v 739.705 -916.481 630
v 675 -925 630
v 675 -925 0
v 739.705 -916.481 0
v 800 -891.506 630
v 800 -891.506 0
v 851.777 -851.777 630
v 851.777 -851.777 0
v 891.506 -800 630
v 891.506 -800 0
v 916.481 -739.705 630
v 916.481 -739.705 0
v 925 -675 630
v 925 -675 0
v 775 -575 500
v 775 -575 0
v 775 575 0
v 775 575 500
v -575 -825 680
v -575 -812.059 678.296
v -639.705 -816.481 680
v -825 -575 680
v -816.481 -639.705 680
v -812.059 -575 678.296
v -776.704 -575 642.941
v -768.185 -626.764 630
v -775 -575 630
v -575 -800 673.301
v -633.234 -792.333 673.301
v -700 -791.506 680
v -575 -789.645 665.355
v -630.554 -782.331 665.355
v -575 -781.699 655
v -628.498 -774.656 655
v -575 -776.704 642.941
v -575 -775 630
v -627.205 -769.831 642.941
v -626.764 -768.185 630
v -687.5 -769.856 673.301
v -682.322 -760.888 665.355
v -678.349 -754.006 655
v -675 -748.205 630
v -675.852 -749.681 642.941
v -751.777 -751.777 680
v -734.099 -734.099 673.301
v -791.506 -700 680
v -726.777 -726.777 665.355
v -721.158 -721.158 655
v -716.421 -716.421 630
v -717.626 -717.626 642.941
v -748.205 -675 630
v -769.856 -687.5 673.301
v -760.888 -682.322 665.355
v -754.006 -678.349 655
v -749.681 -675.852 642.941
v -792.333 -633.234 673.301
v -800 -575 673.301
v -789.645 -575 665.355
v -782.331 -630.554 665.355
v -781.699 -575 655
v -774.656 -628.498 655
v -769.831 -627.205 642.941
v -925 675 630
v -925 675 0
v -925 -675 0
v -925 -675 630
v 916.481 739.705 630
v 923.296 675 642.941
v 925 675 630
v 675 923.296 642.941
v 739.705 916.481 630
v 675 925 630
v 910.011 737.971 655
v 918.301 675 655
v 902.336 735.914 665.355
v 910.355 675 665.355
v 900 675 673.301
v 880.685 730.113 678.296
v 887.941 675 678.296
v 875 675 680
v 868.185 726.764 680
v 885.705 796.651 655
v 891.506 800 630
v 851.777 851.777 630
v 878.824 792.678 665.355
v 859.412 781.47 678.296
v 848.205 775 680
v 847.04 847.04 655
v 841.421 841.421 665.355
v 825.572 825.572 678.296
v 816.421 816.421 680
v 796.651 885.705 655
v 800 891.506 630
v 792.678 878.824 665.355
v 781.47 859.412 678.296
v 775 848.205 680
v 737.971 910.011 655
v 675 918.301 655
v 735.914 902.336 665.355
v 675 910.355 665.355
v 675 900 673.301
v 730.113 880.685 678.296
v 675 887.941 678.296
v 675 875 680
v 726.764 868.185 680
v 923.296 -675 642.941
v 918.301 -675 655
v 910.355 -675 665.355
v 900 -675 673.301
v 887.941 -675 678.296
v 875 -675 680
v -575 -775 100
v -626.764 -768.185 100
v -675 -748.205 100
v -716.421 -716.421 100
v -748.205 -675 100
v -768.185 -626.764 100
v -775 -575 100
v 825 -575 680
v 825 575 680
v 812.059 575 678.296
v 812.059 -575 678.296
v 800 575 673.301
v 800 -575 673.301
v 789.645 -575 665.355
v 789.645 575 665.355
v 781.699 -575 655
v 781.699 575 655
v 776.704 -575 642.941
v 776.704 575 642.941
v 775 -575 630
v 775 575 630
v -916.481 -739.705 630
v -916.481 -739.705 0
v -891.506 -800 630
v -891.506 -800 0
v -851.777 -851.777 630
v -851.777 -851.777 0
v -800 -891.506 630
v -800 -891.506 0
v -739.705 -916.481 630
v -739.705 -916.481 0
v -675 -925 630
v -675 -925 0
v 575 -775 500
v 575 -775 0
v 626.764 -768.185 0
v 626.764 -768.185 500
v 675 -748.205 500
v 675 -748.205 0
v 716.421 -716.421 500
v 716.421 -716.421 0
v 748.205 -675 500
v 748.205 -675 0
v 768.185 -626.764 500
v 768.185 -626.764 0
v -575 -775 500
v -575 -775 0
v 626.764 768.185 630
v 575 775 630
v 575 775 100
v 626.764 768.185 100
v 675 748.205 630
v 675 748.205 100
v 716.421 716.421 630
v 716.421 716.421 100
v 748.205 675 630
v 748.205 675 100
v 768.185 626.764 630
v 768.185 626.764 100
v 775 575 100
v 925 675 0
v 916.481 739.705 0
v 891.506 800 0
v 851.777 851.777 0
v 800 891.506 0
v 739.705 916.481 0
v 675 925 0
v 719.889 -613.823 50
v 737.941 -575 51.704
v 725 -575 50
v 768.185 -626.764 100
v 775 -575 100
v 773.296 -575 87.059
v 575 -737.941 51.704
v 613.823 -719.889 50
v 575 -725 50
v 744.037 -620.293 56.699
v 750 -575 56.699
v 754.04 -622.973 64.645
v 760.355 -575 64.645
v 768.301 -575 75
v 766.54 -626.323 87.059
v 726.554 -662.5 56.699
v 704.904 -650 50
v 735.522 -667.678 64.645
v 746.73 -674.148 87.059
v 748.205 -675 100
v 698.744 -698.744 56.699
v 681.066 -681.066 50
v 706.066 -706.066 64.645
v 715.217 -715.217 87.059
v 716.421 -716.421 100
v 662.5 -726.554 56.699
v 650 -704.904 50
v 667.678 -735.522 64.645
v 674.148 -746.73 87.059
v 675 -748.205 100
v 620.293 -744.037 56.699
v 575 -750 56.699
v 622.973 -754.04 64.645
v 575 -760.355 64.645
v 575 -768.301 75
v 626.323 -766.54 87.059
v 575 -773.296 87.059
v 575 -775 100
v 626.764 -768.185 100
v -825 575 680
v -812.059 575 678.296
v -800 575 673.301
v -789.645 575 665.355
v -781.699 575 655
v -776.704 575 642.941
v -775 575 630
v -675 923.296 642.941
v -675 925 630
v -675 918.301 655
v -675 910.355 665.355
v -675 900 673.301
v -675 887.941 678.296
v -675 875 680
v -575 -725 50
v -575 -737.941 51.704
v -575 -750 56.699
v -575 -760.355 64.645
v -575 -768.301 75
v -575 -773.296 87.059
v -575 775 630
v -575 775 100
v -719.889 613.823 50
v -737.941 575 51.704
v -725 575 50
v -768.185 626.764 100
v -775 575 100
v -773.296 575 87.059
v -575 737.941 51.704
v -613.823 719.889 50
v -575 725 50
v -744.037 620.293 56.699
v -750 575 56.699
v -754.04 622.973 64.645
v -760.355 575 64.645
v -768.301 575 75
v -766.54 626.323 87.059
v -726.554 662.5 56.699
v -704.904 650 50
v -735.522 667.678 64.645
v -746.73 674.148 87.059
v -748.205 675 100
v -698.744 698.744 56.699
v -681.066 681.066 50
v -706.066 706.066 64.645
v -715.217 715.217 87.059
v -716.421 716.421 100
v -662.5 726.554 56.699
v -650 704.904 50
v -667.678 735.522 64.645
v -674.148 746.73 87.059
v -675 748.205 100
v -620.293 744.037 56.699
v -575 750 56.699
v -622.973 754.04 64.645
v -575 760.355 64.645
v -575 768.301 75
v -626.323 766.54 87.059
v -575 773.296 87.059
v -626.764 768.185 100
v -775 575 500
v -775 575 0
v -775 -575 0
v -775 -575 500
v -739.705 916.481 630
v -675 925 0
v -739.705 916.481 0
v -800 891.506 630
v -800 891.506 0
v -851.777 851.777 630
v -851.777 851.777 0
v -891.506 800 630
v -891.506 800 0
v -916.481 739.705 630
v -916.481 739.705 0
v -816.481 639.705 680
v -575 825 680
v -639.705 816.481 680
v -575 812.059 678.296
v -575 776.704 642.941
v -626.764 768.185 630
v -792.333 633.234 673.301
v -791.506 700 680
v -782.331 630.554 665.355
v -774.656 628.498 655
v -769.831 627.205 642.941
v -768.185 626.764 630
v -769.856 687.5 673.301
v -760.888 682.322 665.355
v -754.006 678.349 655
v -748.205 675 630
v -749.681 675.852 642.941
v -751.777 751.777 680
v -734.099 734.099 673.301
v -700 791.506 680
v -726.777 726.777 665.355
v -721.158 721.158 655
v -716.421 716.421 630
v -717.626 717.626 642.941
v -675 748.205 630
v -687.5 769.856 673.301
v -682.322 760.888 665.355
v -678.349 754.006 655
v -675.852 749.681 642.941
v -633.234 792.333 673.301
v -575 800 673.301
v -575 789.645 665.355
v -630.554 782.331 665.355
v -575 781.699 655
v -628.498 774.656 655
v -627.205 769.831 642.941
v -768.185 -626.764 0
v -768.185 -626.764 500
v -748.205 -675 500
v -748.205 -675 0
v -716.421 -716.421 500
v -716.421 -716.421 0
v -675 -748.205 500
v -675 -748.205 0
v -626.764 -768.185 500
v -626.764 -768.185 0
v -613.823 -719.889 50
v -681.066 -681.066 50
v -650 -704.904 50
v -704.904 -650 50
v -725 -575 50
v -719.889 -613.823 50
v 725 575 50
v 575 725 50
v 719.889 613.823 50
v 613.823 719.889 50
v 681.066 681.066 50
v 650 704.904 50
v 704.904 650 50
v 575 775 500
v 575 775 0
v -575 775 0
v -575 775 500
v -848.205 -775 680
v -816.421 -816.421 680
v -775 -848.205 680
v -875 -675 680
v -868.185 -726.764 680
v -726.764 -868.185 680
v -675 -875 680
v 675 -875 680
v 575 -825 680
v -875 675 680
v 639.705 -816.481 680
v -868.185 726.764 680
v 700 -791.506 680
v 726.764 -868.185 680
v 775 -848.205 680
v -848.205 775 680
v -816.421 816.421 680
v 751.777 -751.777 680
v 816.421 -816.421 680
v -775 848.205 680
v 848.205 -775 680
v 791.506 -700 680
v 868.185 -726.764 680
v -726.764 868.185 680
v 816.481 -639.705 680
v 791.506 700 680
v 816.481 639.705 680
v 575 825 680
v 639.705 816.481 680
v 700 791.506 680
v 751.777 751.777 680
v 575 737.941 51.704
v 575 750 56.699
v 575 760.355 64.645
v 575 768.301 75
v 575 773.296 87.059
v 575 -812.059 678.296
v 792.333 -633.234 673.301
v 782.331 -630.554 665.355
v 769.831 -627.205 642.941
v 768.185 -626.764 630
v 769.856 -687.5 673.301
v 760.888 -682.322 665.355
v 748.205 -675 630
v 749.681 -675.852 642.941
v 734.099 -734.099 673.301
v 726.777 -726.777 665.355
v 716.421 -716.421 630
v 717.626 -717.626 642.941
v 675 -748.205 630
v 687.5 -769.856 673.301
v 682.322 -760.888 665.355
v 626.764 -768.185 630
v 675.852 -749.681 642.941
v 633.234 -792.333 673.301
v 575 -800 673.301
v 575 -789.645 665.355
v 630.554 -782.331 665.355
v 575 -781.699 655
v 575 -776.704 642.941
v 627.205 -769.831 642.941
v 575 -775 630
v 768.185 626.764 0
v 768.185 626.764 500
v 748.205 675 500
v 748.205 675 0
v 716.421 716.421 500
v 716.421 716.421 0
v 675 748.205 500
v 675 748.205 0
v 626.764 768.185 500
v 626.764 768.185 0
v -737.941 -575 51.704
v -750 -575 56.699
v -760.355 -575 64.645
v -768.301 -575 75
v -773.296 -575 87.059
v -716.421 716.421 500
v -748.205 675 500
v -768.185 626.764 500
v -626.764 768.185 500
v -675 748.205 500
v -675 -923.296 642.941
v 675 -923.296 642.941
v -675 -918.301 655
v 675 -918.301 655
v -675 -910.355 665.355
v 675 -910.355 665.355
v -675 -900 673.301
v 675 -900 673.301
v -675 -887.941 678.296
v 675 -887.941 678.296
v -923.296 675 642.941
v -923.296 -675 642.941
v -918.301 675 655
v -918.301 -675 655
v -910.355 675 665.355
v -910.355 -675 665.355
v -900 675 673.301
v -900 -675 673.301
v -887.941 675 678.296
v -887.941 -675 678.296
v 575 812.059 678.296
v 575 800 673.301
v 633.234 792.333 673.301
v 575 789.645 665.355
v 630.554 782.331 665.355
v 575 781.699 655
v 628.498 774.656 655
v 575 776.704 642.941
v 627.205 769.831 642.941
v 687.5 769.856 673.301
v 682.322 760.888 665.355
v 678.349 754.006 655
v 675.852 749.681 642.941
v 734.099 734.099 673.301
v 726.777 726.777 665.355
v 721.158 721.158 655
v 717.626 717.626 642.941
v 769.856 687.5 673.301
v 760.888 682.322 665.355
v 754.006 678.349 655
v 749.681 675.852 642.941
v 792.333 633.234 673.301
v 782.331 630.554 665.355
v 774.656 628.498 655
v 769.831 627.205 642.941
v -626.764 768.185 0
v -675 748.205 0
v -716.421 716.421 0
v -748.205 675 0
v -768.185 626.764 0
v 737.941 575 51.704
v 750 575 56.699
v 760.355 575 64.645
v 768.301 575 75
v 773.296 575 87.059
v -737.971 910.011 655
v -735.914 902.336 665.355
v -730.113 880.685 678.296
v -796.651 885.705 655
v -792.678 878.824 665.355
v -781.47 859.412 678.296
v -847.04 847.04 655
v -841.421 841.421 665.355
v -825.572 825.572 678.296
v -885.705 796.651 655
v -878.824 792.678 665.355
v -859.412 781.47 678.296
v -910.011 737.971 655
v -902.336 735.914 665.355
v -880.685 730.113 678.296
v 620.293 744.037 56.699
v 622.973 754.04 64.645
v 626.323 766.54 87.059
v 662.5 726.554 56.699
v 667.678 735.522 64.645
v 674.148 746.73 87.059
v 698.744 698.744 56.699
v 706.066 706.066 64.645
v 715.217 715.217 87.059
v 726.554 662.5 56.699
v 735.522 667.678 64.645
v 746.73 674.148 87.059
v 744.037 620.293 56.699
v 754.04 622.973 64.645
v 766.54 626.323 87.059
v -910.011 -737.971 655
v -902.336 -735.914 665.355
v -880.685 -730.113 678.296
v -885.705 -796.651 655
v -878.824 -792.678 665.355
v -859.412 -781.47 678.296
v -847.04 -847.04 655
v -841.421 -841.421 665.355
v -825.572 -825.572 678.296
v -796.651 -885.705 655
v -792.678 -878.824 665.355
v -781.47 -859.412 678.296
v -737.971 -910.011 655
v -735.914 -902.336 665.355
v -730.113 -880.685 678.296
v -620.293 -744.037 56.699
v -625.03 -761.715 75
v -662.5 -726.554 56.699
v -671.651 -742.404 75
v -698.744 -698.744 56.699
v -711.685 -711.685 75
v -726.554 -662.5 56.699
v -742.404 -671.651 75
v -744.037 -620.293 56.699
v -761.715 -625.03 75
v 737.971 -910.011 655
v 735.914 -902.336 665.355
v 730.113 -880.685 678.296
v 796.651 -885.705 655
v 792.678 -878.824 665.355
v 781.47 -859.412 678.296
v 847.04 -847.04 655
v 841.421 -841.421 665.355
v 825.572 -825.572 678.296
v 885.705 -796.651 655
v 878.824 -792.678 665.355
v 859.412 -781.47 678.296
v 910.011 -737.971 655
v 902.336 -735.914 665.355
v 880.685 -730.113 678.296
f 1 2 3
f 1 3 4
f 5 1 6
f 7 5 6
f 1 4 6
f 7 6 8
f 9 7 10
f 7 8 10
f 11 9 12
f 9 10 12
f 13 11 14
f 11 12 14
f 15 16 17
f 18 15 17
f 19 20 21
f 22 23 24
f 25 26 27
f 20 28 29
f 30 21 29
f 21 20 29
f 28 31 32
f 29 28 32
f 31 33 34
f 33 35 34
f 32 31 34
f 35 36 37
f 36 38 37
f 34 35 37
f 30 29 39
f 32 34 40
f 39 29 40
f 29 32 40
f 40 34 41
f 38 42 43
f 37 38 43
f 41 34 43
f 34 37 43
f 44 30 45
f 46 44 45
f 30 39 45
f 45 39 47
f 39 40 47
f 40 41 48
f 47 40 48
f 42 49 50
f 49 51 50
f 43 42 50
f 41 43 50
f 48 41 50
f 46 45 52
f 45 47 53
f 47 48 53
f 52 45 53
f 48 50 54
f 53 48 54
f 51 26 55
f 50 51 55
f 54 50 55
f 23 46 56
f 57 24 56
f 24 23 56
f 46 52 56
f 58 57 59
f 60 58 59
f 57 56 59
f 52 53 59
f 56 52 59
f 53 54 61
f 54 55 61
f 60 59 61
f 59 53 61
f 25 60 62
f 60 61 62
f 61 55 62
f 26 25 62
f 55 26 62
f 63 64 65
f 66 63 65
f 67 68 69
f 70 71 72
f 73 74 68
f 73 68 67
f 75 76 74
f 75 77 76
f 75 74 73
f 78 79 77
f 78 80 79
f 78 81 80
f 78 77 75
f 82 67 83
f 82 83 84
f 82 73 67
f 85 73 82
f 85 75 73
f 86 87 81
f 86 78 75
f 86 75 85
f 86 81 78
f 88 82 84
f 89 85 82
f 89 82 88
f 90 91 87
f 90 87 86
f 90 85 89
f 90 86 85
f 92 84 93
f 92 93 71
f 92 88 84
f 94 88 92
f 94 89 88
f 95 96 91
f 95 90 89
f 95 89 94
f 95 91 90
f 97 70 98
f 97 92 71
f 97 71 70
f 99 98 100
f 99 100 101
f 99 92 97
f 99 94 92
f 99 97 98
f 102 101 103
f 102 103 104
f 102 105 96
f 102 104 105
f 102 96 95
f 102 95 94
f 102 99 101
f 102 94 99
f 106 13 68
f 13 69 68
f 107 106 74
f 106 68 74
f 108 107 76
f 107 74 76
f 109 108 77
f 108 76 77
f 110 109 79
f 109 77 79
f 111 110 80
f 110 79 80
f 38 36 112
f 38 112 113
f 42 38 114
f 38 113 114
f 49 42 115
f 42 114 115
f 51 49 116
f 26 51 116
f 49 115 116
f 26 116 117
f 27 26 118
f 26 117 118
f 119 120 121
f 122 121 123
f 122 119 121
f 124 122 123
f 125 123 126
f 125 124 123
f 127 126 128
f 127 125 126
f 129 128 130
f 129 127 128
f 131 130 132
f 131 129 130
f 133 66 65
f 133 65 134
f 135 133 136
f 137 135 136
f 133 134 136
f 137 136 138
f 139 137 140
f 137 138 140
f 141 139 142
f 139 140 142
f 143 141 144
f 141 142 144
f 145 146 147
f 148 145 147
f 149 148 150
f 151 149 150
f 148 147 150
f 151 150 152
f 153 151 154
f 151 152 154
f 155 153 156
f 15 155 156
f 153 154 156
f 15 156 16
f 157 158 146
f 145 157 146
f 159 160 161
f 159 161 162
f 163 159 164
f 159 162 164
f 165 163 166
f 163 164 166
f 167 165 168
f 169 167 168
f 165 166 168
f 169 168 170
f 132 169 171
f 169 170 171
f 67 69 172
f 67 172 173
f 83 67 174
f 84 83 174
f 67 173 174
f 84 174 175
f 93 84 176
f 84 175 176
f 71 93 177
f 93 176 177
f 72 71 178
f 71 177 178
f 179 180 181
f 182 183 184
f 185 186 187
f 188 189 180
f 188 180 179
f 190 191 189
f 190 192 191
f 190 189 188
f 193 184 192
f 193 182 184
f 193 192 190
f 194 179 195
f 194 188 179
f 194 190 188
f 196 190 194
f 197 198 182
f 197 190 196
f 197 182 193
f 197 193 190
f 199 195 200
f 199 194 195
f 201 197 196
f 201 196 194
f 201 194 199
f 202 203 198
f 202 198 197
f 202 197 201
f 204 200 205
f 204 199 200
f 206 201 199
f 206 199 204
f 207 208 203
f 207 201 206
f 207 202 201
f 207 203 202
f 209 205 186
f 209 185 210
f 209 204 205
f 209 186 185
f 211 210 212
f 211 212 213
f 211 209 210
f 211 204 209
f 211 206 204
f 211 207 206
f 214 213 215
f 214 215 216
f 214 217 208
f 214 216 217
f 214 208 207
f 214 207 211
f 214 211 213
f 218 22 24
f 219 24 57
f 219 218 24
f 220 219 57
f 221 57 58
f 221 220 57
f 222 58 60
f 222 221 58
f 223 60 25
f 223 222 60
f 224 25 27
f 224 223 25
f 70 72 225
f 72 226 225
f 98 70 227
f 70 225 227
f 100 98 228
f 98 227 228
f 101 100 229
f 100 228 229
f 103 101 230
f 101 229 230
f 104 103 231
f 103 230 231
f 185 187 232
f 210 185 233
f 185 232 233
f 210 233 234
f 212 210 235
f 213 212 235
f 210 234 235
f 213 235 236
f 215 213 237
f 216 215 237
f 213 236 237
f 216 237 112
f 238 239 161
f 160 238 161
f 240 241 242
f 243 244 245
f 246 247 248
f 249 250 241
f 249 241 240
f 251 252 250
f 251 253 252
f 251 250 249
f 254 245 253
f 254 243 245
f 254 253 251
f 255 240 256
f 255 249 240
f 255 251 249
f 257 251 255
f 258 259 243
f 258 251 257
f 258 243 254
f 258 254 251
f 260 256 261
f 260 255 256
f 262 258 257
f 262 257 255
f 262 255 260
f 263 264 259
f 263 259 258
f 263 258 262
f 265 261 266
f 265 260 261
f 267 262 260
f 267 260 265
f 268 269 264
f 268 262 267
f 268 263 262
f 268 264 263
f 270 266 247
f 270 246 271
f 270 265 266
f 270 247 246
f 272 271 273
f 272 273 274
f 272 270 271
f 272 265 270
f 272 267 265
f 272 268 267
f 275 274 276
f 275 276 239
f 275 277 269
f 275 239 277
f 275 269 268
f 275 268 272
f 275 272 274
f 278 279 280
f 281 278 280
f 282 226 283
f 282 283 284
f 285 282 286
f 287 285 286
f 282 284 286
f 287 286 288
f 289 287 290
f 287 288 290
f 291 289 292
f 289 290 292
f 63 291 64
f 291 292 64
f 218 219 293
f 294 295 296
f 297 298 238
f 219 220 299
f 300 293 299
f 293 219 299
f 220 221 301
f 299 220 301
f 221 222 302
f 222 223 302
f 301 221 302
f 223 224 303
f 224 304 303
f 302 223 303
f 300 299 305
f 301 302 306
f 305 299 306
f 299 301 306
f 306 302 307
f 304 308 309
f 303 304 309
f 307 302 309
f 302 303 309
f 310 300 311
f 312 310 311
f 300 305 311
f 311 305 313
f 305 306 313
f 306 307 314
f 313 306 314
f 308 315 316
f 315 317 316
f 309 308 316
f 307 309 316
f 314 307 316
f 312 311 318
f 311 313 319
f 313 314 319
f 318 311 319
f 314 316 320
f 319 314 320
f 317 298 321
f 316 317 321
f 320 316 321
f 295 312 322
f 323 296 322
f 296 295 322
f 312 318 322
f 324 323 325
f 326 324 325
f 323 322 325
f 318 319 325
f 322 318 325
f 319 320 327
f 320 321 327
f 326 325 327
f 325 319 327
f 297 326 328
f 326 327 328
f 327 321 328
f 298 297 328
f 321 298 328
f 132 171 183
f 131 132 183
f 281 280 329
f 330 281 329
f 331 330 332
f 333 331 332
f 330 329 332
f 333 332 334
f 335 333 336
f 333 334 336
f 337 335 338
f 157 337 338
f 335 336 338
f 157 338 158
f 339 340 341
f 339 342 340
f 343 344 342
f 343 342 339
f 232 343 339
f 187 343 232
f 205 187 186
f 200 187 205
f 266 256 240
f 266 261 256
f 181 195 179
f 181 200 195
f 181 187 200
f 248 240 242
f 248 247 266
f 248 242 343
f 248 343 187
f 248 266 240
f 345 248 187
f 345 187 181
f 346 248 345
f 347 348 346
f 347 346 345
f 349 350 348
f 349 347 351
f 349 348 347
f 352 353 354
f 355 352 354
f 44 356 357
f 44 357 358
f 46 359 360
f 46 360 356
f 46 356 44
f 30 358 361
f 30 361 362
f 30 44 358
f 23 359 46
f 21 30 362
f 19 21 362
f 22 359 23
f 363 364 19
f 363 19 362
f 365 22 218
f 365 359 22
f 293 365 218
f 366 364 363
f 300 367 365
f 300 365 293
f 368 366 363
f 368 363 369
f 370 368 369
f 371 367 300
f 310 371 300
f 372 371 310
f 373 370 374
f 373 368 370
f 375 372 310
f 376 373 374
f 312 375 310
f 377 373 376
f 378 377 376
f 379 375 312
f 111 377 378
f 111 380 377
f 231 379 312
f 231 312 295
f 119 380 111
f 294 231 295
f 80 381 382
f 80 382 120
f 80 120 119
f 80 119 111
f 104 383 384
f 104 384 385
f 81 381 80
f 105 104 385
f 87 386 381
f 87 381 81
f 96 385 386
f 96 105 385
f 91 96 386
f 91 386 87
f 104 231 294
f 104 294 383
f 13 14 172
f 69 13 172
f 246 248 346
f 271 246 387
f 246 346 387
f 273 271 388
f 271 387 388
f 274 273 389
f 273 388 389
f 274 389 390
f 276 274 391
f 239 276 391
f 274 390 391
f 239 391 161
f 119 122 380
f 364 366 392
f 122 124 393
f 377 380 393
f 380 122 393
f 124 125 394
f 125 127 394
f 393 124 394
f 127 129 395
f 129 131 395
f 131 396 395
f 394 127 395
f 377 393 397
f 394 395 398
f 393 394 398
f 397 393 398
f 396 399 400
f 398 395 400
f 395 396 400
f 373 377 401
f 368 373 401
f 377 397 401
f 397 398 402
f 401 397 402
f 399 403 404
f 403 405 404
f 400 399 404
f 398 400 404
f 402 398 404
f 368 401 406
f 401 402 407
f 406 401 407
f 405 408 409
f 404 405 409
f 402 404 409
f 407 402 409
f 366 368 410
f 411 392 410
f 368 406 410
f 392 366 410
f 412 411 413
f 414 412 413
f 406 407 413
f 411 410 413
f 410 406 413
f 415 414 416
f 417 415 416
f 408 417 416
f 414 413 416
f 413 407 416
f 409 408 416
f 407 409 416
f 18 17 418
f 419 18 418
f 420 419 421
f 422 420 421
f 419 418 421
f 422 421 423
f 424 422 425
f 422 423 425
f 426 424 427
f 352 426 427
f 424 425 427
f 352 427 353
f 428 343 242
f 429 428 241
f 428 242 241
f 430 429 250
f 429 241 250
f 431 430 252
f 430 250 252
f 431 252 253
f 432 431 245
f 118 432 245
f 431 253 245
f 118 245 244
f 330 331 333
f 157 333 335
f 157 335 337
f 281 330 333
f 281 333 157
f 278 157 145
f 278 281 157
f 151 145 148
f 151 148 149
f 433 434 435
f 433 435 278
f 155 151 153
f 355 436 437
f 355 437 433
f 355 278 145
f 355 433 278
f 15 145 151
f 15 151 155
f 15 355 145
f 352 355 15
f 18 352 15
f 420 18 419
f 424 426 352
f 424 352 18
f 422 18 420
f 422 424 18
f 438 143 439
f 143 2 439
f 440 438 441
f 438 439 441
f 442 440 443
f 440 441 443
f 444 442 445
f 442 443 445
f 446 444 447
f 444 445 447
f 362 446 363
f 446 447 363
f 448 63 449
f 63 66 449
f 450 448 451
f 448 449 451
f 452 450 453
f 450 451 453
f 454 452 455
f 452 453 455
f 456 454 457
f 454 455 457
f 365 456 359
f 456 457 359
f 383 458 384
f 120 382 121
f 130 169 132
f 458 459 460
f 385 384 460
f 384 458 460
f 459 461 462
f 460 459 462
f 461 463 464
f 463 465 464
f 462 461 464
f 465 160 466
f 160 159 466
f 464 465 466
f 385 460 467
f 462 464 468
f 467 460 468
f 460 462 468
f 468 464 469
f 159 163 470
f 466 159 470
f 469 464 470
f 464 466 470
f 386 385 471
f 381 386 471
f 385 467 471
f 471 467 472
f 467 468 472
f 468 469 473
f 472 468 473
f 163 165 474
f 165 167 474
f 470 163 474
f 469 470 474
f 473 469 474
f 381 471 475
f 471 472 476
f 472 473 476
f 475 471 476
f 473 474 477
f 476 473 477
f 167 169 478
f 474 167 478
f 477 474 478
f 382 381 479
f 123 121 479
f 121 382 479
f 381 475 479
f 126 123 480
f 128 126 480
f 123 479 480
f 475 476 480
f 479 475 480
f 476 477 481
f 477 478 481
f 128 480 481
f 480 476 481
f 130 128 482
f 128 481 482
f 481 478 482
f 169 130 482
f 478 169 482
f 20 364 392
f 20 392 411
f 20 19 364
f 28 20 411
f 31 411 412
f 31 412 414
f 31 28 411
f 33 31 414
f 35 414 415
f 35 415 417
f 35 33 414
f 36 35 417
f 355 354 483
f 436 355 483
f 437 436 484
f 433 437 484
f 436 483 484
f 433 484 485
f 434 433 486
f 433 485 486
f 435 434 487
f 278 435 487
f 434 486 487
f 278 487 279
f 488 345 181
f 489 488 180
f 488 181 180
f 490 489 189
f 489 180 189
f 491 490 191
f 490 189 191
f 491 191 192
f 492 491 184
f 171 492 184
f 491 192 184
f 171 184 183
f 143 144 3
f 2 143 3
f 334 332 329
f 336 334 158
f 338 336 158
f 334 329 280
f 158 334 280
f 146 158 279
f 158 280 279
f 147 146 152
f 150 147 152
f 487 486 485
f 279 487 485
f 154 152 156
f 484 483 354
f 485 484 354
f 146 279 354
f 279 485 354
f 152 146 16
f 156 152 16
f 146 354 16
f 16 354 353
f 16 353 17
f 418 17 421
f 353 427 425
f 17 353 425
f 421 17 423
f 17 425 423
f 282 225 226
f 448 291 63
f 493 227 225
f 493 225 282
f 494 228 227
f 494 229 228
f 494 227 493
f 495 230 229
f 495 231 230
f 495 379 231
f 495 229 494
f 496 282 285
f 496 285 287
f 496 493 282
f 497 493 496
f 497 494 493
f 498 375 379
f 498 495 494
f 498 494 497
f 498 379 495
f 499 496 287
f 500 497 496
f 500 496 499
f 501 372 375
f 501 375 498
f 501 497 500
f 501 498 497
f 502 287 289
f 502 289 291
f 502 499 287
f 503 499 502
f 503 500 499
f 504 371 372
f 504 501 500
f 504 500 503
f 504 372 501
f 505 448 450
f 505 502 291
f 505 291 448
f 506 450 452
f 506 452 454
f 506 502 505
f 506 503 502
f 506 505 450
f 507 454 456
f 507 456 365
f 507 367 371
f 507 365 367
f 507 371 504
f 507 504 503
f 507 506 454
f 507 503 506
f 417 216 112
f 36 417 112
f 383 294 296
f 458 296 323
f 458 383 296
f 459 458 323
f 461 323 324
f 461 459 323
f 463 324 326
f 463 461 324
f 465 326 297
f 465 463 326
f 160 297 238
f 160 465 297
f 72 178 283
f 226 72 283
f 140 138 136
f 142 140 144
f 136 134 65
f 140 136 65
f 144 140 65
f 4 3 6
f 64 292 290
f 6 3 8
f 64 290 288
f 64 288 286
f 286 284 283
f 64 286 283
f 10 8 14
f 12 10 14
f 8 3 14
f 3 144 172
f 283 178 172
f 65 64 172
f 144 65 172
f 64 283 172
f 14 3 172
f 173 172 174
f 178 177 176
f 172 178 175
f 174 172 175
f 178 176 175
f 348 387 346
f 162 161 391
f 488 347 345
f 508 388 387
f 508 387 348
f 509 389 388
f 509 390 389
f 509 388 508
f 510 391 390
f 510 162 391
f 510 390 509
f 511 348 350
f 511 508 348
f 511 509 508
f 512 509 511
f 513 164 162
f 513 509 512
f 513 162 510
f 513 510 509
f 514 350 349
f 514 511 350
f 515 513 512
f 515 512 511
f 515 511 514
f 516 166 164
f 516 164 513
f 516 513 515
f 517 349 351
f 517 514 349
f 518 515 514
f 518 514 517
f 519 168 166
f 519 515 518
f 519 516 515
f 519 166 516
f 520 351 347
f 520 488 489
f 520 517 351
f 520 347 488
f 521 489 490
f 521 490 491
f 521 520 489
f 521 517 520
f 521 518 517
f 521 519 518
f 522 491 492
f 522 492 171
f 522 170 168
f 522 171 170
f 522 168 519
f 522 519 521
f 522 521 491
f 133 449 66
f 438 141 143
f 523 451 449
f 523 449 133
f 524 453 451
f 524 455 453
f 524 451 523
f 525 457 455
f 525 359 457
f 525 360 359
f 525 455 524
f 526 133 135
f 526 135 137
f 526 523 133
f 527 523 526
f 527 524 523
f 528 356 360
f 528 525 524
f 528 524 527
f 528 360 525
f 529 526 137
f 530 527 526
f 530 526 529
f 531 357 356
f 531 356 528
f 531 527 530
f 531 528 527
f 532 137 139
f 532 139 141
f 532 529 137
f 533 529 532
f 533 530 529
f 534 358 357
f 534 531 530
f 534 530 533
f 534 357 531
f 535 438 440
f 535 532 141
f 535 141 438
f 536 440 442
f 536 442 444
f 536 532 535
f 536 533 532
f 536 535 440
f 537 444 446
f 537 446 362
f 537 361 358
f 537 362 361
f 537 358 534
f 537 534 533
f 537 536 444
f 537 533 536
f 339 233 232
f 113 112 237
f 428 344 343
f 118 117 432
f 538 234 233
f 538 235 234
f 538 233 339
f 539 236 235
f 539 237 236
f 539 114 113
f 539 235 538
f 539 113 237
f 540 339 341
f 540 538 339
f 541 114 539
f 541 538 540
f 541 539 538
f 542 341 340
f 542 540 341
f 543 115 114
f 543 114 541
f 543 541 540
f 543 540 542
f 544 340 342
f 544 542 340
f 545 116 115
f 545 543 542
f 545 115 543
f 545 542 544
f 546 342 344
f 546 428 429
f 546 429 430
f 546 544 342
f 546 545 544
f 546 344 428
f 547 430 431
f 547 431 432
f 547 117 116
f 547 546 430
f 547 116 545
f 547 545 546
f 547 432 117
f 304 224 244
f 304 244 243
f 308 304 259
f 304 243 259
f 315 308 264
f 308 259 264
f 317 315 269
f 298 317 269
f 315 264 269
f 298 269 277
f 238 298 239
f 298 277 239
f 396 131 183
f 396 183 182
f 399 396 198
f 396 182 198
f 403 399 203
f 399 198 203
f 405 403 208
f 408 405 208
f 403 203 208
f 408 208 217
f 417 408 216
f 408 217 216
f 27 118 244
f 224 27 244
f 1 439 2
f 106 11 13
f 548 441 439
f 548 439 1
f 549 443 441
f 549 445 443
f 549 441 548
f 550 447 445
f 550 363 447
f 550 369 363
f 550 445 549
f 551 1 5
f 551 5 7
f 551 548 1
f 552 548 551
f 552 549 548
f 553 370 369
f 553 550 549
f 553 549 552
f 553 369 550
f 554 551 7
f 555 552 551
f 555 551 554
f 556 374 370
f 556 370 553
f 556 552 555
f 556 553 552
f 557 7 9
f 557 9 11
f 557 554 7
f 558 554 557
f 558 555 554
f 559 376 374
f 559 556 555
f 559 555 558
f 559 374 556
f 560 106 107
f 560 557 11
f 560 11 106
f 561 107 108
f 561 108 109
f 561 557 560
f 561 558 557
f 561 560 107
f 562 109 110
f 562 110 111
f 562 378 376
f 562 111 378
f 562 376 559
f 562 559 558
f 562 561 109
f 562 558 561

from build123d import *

# Parameters (mm, degrees)
F1_DEPTH = 50
F2_DEPTH = 680
F3_R     = 50
F4_DEPTH = 500


with BuildPart() as f1:
    # F0 (on Top) → F1 (new body)
    with BuildSketch(Plane.XY):
        with BuildLine():
            ThreePointArc((-925, -675), (-851.7766952966, -851.7766952966), (-675, -925))
            Line((-675, -925), (675, -925))
            ThreePointArc((675, -925), (851.7766952966, -851.7766952966), (925, -675))
            Line((925, -675), (925, 675))
            ThreePointArc((925, 675), (851.7766952966, 851.7766952966), (675, 925))
            Line((675, 925), (-675, 925))
            ThreePointArc((-675, 925), (-851.7766952966, 851.7766952966), (-925, 675))
            Line((-925, 675), (-925, -675))
        make_face()
        with BuildLine():
            Line((575, -775), (-575, -775))
            ThreePointArc((-575, -775), (-716.4213562373, -716.4213562373), (-775, -575))
            Line((-775, -575), (-775, 575))
            ThreePointArc((-775, 575), (-716.4213562373, 716.4213562373), (-575, 775))
            Line((-575, 775), (575, 775))
            ThreePointArc((575, 775), (716.4213562373, 716.4213562373), (775, 575))
            Line((775, 575), (775, -575))
            ThreePointArc((775, -575), (716.4213562373, -716.4213562373), (575, -775))
        make_face(mode=Mode.SUBTRACT)
        with BuildLine():
            ThreePointArc((-775, -575), (-716.4213562373, -716.4213562373), (-575, -775))
            Line((-575, -775), (575, -775))
            ThreePointArc((575, -775), (716.4213562373, -716.4213562373), (775, -575))
            Line((775, -575), (775, 575))
            ThreePointArc((775, 575), (716.4213562373, 716.4213562373), (575, 775))
            Line((575, 775), (-575, 775))
            ThreePointArc((-575, 775), (-716.4213562373, 716.4213562373), (-775, 575))
            Line((-775, 575), (-775, -575))
        make_face()
    extrude(amount=F1_DEPTH)

    # F0 (on Top) → F2 (join)
    with BuildSketch(Plane.XY):
        with BuildLine():
            ThreePointArc((-925, -675), (-851.7766952966, -851.7766952966), (-675, -925))
            Line((-675, -925), (675, -925))
            ThreePointArc((675, -925), (851.7766952966, -851.7766952966), (925, -675))
            Line((925, -675), (925, 675))
            ThreePointArc((925, 675), (851.7766952966, 851.7766952966), (675, 925))
            Line((675, 925), (-675, 925))
            ThreePointArc((-675, 925), (-851.7766952966, 851.7766952966), (-925, 675))
            Line((-925, 675), (-925, -675))
        make_face()
        with BuildLine():
            Line((575, -775), (-575, -775))
            ThreePointArc((-575, -775), (-716.4213562373, -716.4213562373), (-775, -575))
            Line((-775, -575), (-775, 575))
            ThreePointArc((-775, 575), (-716.4213562373, 716.4213562373), (-575, 775))
            Line((-575, 775), (575, 775))
            ThreePointArc((575, 775), (716.4213562373, 716.4213562373), (775, 575))
            Line((775, 575), (775, -575))
            ThreePointArc((775, -575), (716.4213562373, -716.4213562373), (575, -775))
        make_face(mode=Mode.SUBTRACT)
    extrude(amount=F2_DEPTH)

    # F3
    f3_edges = [f1.edges().sort_by_distance(p)[0] for p in [
        (-851.776695, -851.776695, 680),
        (0, -925, 680),
        (851.776695, -851.776695, 680),
        (925, 0, 680),
        (851.776695, 851.776695, 680),
        (0, 925, 680),
        (-851.776695, 851.776695, 680),
        (-925, 0, 680),
        (0, -775, 680),
        (-716.421356, -716.421356, 680),
        (-775, 0, 680),
        (-716.421356, 716.421356, 680),
        (0, 775, 680),
        (716.421356, 716.421356, 680),
        (775, 0, 680),
        (716.421356, -716.421356, 680),
        (-716.421356, -716.421356, 50),
        (-775, 0, 50),
        (-716.421356, 716.421356, 50),
        (0, 775, 50),
        (716.421356, 716.421356, 50),
        (775, 0, 50),
        (716.421356, -716.421356, 50),
        (0, -775, 50),
    ]]
    fillet(f3_edges, radius=F3_R)


with BuildPart() as f4:
    # F0 (on Top) → F4 (new body)
    with BuildSketch(Plane.XY):
        with BuildLine():
            ThreePointArc((-775, -575), (-716.4213562373, -716.4213562373), (-575, -775))
            Line((-575, -775), (575, -775))
            ThreePointArc((575, -775), (716.4213562373, -716.4213562373), (775, -575))
            Line((775, -575), (775, 575))
            ThreePointArc((775, 575), (716.4213562373, 716.4213562373), (575, 775))
            Line((575, 775), (-575, 775))
            ThreePointArc((-575, 775), (-716.4213562373, 716.4213562373), (-775, 575))
            Line((-775, 575), (-775, -575))
        make_face()
    extrude(amount=F4_DEPTH)


solid = Compound([f1.part, f4.part])
